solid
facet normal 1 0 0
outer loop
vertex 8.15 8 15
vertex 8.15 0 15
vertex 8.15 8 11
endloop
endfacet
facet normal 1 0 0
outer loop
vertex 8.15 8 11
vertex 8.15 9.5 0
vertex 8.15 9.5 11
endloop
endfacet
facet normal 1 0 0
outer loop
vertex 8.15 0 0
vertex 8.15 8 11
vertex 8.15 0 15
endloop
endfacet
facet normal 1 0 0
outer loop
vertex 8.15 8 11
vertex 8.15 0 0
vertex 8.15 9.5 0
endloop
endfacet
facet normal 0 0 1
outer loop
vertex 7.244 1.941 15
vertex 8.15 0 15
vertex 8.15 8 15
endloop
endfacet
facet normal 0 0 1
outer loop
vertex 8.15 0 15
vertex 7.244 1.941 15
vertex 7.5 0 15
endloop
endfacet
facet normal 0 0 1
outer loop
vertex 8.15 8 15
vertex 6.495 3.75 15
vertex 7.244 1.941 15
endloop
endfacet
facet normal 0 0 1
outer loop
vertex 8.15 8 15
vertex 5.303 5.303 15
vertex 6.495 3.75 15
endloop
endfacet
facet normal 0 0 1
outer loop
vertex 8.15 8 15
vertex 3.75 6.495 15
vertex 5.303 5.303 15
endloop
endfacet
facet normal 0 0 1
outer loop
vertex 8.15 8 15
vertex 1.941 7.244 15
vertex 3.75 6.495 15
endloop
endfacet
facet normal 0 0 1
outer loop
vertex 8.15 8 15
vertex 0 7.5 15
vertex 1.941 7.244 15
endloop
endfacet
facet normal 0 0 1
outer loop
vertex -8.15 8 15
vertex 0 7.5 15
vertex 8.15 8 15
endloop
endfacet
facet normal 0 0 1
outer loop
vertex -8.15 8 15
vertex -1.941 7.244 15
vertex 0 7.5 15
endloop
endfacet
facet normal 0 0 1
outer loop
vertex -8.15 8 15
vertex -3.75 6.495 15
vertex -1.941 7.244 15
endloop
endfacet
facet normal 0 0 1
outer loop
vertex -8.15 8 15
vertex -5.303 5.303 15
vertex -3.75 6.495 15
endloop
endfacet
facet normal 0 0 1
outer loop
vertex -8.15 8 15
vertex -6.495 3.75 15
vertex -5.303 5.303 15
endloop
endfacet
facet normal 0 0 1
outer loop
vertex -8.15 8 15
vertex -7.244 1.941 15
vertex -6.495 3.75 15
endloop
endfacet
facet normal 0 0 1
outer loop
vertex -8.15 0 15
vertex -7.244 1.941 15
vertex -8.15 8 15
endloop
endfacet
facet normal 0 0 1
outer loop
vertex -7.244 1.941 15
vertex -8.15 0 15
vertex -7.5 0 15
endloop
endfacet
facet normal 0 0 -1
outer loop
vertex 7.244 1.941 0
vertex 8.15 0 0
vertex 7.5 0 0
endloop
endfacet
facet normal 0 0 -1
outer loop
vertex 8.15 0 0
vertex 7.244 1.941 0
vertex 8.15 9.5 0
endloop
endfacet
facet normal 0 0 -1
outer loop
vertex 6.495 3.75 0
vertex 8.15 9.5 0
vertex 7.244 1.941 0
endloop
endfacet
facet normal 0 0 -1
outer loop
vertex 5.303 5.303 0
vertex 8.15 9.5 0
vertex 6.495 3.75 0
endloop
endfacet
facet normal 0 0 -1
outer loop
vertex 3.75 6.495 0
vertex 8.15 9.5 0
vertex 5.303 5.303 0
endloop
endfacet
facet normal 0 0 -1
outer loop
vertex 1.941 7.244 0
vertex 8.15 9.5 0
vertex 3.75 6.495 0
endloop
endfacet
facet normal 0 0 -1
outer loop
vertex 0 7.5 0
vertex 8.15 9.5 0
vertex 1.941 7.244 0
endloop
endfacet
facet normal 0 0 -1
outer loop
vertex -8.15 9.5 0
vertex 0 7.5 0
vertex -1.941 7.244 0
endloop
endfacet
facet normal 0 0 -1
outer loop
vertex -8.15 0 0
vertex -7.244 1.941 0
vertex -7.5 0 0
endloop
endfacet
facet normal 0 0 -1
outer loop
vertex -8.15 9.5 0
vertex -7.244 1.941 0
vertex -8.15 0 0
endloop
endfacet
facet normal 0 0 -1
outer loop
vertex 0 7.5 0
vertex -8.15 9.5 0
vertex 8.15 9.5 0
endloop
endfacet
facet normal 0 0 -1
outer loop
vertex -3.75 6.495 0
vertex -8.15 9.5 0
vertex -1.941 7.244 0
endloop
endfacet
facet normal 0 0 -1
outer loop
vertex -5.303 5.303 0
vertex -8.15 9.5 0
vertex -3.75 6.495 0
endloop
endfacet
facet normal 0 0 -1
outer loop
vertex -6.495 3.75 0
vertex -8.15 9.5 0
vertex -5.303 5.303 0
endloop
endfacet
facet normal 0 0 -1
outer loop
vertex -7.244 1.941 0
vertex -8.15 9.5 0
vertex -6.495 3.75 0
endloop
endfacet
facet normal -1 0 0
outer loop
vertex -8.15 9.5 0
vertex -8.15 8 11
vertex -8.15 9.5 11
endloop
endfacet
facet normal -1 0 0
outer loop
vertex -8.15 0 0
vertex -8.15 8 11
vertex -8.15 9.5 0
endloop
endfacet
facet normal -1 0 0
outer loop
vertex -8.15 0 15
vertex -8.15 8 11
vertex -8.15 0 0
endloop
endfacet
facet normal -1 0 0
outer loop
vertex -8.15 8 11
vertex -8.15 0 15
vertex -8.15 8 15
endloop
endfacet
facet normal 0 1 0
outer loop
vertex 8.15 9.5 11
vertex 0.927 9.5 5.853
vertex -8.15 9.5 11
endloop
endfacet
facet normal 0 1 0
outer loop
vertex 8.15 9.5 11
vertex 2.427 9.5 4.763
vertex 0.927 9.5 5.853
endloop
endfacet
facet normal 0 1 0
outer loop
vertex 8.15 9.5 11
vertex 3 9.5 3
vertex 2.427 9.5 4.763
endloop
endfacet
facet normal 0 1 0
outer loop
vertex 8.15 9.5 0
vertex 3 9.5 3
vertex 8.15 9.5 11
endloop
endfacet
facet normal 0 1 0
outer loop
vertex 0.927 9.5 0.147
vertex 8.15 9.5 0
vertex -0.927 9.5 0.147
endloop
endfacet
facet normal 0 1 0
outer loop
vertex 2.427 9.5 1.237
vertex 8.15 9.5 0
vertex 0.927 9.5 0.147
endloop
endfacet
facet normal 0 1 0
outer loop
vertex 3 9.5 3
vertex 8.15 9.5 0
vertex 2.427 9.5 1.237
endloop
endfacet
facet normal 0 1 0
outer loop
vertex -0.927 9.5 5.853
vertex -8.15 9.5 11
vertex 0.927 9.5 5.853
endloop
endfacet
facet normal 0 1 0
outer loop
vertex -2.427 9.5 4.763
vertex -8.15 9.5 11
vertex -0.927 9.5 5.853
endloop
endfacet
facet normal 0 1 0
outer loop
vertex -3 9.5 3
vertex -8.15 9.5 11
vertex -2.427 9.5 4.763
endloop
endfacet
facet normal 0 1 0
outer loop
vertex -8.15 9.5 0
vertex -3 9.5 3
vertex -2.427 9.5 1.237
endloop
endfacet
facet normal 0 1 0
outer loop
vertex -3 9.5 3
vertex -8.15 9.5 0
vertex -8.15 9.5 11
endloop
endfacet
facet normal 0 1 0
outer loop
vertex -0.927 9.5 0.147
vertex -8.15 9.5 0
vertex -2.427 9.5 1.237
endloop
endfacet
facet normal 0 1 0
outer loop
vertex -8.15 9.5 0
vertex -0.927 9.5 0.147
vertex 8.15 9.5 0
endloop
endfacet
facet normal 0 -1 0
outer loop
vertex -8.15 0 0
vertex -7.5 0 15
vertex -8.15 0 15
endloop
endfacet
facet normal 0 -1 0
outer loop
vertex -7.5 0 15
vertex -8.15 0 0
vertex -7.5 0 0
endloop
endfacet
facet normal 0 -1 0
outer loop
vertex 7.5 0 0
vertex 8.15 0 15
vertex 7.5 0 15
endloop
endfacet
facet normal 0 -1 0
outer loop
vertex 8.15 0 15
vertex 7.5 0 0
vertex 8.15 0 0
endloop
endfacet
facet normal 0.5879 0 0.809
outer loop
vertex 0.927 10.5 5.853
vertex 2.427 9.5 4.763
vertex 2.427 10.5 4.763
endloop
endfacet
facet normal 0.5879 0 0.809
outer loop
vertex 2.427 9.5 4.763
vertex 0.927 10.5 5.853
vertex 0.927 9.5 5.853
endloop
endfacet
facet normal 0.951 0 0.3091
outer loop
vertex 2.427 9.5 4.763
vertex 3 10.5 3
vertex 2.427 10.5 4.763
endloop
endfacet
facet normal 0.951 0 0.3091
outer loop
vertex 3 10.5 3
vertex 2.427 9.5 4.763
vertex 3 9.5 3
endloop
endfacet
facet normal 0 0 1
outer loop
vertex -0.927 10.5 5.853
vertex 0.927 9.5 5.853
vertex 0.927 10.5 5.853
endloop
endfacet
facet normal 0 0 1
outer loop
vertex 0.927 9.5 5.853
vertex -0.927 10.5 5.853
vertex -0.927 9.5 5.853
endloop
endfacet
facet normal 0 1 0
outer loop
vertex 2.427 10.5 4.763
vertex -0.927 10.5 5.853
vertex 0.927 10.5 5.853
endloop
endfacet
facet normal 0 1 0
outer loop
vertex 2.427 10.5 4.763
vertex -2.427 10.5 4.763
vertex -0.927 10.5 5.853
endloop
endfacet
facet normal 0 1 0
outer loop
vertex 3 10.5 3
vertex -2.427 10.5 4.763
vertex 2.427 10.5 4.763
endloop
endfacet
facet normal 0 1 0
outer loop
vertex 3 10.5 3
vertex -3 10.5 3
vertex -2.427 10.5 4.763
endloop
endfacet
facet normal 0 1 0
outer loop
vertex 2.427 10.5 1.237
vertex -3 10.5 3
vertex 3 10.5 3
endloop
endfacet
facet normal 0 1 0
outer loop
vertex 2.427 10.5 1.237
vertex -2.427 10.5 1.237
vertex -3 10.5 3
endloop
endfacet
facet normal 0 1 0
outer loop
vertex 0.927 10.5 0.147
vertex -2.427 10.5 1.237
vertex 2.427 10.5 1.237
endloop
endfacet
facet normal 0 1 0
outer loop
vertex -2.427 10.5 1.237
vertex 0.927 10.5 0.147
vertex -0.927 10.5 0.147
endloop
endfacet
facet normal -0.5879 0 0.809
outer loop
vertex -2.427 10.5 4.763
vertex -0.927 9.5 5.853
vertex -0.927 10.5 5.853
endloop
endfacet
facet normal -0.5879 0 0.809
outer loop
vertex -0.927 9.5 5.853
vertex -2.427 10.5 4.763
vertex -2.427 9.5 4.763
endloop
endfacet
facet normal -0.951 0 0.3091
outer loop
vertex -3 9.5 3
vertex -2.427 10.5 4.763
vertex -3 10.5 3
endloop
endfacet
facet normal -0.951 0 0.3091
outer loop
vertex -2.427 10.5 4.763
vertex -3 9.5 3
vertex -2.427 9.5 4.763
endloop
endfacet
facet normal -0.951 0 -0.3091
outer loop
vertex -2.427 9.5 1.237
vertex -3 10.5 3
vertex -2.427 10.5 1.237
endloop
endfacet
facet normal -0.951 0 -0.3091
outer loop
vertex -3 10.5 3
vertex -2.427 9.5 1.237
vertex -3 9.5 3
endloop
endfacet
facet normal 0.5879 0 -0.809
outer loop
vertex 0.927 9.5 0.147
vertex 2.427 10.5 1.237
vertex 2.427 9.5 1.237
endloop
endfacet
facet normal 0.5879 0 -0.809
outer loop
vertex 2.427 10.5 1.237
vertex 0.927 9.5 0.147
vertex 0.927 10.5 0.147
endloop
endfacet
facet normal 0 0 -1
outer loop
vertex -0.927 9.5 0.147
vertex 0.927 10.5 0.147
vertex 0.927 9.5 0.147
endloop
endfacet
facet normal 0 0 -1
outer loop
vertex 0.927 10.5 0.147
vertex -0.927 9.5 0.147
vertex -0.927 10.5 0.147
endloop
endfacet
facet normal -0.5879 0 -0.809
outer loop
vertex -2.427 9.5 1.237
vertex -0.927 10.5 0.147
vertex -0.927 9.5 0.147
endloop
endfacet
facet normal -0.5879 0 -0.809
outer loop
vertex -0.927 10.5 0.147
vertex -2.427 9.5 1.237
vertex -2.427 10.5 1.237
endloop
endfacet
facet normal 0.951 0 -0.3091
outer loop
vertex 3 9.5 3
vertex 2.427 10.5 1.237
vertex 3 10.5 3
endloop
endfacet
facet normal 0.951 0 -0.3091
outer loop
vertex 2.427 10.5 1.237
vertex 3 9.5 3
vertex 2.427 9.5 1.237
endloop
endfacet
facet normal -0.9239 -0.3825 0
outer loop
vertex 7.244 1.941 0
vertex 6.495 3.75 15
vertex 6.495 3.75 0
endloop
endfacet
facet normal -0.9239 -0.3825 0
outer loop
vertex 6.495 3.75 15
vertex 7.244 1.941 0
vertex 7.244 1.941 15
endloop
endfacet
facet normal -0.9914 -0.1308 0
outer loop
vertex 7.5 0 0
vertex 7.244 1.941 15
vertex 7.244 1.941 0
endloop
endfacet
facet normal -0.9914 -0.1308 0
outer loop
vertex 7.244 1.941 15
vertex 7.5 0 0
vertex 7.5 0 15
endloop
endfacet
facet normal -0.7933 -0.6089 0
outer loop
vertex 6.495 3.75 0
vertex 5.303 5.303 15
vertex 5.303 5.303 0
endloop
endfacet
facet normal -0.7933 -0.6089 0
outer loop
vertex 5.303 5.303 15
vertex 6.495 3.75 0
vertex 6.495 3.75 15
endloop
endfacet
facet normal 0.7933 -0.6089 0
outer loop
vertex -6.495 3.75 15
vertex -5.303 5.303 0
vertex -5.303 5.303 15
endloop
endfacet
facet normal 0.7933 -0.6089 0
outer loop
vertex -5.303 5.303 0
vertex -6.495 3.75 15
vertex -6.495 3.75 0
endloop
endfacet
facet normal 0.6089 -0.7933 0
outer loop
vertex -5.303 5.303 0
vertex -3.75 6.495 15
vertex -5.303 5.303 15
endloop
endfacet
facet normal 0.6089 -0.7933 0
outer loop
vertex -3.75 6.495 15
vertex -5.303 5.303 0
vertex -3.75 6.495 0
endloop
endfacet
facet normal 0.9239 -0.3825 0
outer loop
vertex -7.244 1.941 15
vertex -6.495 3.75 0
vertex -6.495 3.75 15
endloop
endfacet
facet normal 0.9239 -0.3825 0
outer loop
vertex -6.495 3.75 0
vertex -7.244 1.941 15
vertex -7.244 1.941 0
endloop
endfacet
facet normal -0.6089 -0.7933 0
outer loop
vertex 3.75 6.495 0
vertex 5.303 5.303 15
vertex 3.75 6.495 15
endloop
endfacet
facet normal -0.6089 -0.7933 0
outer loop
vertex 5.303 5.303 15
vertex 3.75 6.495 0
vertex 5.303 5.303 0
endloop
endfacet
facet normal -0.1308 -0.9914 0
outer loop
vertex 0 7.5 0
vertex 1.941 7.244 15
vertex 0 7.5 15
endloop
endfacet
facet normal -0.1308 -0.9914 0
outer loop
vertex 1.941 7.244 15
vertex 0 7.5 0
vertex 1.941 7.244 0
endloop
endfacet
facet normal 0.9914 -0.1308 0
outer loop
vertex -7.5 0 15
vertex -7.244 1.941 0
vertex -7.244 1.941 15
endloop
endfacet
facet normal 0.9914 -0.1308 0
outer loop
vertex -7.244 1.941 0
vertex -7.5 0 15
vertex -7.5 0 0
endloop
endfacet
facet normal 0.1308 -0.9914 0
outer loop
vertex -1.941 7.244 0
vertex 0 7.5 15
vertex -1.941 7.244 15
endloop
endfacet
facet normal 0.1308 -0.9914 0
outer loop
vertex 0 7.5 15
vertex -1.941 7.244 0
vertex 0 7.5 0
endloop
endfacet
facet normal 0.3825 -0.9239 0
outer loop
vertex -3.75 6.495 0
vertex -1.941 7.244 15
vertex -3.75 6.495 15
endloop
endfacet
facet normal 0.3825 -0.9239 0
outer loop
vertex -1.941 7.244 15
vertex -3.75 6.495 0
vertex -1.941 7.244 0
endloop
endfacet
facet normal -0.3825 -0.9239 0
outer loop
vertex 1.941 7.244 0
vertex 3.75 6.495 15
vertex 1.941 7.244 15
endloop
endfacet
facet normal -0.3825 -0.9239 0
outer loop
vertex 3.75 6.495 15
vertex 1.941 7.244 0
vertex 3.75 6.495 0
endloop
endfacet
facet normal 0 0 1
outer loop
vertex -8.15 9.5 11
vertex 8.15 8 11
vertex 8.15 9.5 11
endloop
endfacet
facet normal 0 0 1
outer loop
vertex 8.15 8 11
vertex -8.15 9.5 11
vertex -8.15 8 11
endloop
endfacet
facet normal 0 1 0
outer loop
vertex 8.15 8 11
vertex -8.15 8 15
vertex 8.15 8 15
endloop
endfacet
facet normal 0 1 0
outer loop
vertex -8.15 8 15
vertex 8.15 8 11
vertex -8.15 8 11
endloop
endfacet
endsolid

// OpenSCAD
adapter_width = 16.3;
a_depth = 9.5;
a_height = 15;

difference() {
  translate([-adapter_width/2,0,0]) {
    cube([adapter_width,a_depth,a_height]);
    translate([adapter_width/2,a_depth,3]) rotate([90,0,0]) cylinder(r=3.0,h=2,center=true);
  }
  cylinder(r=15/2,h=90);
  translate([0,a_depth,a_height-2]) cube([20,3,4],center=true);
}
